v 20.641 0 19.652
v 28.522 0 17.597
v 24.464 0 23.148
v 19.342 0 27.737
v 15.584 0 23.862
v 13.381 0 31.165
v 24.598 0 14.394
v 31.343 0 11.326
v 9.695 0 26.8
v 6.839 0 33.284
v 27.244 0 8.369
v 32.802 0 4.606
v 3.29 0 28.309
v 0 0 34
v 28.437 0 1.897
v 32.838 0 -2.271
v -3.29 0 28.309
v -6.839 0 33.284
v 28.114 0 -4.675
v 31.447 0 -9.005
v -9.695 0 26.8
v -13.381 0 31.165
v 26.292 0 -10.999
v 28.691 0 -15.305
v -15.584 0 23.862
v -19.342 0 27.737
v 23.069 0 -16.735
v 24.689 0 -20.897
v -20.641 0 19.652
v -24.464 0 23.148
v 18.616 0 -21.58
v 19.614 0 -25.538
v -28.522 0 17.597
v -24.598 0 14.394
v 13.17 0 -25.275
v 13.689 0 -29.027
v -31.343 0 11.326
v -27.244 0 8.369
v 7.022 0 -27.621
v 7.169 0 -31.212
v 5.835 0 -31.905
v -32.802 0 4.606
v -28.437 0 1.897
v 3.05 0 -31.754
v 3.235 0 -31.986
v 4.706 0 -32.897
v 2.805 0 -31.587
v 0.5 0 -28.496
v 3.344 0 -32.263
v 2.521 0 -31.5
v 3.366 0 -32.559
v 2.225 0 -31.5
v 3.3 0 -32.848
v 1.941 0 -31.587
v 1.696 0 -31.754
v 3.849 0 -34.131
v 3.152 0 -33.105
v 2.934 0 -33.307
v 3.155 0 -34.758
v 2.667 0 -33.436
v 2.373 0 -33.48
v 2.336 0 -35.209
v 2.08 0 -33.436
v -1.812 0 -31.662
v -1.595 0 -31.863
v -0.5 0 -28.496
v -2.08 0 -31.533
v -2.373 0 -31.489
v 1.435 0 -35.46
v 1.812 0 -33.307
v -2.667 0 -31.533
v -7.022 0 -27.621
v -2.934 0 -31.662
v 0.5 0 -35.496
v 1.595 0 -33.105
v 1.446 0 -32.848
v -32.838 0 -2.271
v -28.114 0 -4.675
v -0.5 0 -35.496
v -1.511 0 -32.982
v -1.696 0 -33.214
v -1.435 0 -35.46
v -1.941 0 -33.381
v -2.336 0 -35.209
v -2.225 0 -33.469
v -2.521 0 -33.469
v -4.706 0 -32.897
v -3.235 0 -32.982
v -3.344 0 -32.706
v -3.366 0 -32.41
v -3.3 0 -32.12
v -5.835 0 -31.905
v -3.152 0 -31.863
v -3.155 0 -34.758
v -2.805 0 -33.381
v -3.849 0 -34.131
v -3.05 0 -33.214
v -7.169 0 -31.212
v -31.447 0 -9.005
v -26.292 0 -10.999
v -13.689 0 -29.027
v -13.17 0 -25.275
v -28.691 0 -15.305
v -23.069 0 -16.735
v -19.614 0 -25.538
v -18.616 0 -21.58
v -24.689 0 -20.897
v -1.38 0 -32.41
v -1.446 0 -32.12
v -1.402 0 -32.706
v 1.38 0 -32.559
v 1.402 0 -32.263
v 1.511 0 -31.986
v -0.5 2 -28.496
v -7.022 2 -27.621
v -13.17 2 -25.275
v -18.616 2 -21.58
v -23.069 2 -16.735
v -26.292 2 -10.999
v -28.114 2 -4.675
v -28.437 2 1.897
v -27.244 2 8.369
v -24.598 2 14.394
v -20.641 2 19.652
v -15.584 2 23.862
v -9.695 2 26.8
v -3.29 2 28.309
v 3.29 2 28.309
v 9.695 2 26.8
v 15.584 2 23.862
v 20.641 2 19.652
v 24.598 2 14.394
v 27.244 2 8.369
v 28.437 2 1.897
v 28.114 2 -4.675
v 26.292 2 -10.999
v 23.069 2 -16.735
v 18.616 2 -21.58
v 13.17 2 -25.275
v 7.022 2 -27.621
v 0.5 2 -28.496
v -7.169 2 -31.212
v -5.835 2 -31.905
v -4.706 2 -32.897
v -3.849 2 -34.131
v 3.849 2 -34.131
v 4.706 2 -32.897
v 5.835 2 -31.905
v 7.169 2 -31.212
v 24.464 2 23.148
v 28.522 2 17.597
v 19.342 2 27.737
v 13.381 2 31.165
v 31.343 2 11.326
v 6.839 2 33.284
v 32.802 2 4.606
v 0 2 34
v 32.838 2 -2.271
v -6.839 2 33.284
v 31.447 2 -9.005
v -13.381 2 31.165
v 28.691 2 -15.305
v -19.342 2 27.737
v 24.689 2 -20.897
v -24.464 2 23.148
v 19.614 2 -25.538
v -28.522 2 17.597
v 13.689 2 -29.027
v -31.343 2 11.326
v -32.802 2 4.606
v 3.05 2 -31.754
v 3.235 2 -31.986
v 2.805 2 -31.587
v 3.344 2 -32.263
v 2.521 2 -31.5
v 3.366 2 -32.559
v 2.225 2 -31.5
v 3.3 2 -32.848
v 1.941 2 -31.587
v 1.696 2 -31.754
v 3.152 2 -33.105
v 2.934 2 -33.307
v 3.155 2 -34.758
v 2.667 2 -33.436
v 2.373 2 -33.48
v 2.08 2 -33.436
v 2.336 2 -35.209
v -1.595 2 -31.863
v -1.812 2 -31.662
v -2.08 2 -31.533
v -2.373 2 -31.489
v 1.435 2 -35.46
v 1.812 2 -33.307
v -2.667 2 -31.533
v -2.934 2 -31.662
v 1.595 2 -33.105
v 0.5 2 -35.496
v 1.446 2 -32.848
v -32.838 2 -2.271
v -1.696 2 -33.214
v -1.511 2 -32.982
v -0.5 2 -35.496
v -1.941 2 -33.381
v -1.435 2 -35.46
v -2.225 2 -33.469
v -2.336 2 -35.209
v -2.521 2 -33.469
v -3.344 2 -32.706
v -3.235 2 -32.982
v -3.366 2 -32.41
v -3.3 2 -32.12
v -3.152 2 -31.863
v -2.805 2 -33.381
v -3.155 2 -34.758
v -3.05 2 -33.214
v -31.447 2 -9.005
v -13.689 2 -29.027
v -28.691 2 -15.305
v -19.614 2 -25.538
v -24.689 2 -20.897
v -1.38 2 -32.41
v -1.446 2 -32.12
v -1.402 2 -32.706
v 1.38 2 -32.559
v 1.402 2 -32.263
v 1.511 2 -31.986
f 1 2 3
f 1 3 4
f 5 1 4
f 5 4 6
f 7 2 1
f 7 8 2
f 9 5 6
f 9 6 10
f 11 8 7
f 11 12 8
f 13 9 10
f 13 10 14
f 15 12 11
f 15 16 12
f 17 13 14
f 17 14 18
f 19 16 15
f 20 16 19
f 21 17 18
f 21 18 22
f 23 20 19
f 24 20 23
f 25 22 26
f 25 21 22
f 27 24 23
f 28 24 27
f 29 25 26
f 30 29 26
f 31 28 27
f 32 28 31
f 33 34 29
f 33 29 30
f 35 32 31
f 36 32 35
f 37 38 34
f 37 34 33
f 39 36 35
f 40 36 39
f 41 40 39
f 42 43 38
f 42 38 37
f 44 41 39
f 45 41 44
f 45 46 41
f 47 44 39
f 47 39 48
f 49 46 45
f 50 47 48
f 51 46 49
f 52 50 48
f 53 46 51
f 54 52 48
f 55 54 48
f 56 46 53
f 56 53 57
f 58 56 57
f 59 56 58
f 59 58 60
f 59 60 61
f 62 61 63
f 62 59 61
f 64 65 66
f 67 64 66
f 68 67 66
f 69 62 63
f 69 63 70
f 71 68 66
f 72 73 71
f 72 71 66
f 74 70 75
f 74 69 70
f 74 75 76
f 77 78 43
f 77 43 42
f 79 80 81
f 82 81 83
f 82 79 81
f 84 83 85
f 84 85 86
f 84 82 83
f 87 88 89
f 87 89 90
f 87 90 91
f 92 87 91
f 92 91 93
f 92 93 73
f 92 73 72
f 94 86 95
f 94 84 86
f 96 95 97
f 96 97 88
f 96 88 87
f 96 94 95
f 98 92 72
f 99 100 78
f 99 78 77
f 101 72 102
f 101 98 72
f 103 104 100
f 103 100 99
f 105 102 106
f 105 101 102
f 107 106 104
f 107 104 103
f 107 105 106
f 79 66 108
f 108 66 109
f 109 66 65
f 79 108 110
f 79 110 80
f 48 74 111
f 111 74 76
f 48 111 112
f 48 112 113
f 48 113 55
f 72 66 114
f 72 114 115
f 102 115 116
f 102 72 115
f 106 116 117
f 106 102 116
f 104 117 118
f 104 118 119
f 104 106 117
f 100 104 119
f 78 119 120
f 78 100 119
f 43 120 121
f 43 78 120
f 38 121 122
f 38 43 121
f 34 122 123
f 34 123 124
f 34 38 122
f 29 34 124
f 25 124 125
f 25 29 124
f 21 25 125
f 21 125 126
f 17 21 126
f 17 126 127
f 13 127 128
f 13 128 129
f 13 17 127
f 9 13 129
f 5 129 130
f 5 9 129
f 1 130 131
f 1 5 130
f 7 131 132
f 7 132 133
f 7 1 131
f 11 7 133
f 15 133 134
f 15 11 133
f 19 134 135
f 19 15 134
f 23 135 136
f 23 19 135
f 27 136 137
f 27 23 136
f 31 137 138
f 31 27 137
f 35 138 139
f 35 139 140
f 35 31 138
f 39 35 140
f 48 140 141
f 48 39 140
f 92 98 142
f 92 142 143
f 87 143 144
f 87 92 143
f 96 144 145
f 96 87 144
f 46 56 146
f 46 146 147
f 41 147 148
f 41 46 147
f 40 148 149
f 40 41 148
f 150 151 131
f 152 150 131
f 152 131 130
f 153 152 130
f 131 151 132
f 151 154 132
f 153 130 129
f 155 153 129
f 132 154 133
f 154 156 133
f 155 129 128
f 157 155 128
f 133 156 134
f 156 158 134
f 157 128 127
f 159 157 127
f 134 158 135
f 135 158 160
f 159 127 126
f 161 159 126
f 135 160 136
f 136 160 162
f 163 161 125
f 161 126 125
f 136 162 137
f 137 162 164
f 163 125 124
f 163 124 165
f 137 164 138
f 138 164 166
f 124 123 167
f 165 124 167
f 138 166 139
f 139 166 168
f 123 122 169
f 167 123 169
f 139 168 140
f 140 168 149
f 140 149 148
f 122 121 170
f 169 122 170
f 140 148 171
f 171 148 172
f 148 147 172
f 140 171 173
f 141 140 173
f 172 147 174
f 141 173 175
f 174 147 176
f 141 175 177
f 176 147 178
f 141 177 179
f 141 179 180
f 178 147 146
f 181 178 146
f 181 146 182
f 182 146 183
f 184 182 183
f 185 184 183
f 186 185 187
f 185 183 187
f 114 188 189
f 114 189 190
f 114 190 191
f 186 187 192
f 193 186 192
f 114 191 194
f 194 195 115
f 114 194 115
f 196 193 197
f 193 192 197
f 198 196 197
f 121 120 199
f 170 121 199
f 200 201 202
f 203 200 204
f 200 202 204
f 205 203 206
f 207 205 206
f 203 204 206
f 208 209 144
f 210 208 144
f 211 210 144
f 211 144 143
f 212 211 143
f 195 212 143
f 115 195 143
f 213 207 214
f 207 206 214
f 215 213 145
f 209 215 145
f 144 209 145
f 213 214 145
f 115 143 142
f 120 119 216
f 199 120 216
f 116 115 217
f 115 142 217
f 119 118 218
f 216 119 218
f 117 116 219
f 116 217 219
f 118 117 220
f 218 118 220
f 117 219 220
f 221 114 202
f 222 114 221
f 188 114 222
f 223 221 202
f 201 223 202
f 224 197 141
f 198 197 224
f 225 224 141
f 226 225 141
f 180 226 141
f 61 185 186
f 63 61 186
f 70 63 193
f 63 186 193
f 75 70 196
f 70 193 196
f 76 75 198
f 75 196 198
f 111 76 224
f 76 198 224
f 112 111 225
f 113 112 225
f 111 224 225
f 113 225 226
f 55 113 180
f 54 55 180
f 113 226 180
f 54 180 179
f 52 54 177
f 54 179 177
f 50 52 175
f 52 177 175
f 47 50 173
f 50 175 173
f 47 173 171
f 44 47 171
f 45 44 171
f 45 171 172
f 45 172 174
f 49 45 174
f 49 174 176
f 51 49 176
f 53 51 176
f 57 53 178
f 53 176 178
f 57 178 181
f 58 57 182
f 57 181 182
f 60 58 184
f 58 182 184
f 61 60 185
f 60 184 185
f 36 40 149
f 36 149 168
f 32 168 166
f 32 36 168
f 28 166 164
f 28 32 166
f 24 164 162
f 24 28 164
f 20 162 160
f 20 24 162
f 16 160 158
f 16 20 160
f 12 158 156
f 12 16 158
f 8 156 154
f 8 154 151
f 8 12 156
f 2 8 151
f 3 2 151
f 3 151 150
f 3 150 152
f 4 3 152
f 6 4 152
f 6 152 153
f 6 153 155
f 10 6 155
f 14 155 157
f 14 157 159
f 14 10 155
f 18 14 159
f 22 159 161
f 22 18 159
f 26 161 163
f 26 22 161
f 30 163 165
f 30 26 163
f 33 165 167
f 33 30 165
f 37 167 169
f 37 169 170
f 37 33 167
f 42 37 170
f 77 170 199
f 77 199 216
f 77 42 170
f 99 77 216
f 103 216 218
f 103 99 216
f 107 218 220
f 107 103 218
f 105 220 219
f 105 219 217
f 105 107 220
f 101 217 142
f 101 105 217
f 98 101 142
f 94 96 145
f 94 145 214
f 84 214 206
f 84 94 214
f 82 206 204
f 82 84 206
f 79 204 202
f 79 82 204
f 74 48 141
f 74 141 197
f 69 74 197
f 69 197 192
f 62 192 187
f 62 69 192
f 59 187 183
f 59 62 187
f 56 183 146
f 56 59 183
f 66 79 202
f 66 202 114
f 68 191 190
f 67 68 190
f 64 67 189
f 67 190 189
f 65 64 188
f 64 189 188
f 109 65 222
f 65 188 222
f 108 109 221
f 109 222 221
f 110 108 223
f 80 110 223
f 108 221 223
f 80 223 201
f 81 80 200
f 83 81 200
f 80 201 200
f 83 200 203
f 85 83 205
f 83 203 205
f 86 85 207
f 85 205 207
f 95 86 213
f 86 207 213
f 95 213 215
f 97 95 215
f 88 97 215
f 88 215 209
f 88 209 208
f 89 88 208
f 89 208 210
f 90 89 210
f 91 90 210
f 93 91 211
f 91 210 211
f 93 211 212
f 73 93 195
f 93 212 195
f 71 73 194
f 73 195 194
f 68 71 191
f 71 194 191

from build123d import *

# Parameters (mm, degrees)
RESSALTO_EXTRUS_O1_DEPTH = 2
ESBO_O2_R                = 0.995647449
CORTE_EXTRUS_O1_DEPTH    = 2


with BuildPart() as part:
    # Esboço1 → Ressalto-extrusão1 (new body)
    with BuildSketch(Plane(origin=(0, 0, 0), x_dir=(1, 0, 0), z_dir=(0, 1, 0))):
        with BuildLine():
            Line((-0.5, 35.495613698), (-0.5, 28.495613698))
            ThreePointArc((-0.5, 28.495613698), (0, -28.5), (0.5, 28.495613698))
            Line((0.5, 28.495613698), (0.5, 35.495613698))
            ThreePointArc((0.5, 35.495613698), (2.33575042, 35.209276303), (3.8486175, 34.130757919))
            ThreePointArc((3.8486175, 34.130757919), (5.24059873, 32.366531639), (7.168579512, 31.211977086))
            ThreePointArc((7.168579512, 31.211977086), (0, -34), (-7.168579512, 31.211977086))
            ThreePointArc((-7.168579512, 31.211977086), (-5.24059873, 32.366531639), (-3.8486175, 34.130757919))
            ThreePointArc((-3.8486175, 34.130757919), (-2.33575042, 35.209276303), (-0.5, 35.495613698))
        make_face()
    extrude(amount=RESSALTO_EXTRUS_O1_DEPTH)

    # Esboço2 → Corte-extrusão1 (cut)
    with BuildSketch(Plane(origin=(0, 2, 0), x_dir=(1, 0, 0), z_dir=(0, 1, 0))):
        with Locations(Location((-2.373103124, 32.484243676, 0), (0, 0, 270))):
            Circle(ESBO_O2_R)
        with Locations(Location((2.373103124, 32.484243676, 0), (0, 0, 90))):
            Circle(ESBO_O2_R)
    extrude(amount=-CORTE_EXTRUS_O1_DEPTH, mode=Mode.SUBTRACT)


solid = part.part
